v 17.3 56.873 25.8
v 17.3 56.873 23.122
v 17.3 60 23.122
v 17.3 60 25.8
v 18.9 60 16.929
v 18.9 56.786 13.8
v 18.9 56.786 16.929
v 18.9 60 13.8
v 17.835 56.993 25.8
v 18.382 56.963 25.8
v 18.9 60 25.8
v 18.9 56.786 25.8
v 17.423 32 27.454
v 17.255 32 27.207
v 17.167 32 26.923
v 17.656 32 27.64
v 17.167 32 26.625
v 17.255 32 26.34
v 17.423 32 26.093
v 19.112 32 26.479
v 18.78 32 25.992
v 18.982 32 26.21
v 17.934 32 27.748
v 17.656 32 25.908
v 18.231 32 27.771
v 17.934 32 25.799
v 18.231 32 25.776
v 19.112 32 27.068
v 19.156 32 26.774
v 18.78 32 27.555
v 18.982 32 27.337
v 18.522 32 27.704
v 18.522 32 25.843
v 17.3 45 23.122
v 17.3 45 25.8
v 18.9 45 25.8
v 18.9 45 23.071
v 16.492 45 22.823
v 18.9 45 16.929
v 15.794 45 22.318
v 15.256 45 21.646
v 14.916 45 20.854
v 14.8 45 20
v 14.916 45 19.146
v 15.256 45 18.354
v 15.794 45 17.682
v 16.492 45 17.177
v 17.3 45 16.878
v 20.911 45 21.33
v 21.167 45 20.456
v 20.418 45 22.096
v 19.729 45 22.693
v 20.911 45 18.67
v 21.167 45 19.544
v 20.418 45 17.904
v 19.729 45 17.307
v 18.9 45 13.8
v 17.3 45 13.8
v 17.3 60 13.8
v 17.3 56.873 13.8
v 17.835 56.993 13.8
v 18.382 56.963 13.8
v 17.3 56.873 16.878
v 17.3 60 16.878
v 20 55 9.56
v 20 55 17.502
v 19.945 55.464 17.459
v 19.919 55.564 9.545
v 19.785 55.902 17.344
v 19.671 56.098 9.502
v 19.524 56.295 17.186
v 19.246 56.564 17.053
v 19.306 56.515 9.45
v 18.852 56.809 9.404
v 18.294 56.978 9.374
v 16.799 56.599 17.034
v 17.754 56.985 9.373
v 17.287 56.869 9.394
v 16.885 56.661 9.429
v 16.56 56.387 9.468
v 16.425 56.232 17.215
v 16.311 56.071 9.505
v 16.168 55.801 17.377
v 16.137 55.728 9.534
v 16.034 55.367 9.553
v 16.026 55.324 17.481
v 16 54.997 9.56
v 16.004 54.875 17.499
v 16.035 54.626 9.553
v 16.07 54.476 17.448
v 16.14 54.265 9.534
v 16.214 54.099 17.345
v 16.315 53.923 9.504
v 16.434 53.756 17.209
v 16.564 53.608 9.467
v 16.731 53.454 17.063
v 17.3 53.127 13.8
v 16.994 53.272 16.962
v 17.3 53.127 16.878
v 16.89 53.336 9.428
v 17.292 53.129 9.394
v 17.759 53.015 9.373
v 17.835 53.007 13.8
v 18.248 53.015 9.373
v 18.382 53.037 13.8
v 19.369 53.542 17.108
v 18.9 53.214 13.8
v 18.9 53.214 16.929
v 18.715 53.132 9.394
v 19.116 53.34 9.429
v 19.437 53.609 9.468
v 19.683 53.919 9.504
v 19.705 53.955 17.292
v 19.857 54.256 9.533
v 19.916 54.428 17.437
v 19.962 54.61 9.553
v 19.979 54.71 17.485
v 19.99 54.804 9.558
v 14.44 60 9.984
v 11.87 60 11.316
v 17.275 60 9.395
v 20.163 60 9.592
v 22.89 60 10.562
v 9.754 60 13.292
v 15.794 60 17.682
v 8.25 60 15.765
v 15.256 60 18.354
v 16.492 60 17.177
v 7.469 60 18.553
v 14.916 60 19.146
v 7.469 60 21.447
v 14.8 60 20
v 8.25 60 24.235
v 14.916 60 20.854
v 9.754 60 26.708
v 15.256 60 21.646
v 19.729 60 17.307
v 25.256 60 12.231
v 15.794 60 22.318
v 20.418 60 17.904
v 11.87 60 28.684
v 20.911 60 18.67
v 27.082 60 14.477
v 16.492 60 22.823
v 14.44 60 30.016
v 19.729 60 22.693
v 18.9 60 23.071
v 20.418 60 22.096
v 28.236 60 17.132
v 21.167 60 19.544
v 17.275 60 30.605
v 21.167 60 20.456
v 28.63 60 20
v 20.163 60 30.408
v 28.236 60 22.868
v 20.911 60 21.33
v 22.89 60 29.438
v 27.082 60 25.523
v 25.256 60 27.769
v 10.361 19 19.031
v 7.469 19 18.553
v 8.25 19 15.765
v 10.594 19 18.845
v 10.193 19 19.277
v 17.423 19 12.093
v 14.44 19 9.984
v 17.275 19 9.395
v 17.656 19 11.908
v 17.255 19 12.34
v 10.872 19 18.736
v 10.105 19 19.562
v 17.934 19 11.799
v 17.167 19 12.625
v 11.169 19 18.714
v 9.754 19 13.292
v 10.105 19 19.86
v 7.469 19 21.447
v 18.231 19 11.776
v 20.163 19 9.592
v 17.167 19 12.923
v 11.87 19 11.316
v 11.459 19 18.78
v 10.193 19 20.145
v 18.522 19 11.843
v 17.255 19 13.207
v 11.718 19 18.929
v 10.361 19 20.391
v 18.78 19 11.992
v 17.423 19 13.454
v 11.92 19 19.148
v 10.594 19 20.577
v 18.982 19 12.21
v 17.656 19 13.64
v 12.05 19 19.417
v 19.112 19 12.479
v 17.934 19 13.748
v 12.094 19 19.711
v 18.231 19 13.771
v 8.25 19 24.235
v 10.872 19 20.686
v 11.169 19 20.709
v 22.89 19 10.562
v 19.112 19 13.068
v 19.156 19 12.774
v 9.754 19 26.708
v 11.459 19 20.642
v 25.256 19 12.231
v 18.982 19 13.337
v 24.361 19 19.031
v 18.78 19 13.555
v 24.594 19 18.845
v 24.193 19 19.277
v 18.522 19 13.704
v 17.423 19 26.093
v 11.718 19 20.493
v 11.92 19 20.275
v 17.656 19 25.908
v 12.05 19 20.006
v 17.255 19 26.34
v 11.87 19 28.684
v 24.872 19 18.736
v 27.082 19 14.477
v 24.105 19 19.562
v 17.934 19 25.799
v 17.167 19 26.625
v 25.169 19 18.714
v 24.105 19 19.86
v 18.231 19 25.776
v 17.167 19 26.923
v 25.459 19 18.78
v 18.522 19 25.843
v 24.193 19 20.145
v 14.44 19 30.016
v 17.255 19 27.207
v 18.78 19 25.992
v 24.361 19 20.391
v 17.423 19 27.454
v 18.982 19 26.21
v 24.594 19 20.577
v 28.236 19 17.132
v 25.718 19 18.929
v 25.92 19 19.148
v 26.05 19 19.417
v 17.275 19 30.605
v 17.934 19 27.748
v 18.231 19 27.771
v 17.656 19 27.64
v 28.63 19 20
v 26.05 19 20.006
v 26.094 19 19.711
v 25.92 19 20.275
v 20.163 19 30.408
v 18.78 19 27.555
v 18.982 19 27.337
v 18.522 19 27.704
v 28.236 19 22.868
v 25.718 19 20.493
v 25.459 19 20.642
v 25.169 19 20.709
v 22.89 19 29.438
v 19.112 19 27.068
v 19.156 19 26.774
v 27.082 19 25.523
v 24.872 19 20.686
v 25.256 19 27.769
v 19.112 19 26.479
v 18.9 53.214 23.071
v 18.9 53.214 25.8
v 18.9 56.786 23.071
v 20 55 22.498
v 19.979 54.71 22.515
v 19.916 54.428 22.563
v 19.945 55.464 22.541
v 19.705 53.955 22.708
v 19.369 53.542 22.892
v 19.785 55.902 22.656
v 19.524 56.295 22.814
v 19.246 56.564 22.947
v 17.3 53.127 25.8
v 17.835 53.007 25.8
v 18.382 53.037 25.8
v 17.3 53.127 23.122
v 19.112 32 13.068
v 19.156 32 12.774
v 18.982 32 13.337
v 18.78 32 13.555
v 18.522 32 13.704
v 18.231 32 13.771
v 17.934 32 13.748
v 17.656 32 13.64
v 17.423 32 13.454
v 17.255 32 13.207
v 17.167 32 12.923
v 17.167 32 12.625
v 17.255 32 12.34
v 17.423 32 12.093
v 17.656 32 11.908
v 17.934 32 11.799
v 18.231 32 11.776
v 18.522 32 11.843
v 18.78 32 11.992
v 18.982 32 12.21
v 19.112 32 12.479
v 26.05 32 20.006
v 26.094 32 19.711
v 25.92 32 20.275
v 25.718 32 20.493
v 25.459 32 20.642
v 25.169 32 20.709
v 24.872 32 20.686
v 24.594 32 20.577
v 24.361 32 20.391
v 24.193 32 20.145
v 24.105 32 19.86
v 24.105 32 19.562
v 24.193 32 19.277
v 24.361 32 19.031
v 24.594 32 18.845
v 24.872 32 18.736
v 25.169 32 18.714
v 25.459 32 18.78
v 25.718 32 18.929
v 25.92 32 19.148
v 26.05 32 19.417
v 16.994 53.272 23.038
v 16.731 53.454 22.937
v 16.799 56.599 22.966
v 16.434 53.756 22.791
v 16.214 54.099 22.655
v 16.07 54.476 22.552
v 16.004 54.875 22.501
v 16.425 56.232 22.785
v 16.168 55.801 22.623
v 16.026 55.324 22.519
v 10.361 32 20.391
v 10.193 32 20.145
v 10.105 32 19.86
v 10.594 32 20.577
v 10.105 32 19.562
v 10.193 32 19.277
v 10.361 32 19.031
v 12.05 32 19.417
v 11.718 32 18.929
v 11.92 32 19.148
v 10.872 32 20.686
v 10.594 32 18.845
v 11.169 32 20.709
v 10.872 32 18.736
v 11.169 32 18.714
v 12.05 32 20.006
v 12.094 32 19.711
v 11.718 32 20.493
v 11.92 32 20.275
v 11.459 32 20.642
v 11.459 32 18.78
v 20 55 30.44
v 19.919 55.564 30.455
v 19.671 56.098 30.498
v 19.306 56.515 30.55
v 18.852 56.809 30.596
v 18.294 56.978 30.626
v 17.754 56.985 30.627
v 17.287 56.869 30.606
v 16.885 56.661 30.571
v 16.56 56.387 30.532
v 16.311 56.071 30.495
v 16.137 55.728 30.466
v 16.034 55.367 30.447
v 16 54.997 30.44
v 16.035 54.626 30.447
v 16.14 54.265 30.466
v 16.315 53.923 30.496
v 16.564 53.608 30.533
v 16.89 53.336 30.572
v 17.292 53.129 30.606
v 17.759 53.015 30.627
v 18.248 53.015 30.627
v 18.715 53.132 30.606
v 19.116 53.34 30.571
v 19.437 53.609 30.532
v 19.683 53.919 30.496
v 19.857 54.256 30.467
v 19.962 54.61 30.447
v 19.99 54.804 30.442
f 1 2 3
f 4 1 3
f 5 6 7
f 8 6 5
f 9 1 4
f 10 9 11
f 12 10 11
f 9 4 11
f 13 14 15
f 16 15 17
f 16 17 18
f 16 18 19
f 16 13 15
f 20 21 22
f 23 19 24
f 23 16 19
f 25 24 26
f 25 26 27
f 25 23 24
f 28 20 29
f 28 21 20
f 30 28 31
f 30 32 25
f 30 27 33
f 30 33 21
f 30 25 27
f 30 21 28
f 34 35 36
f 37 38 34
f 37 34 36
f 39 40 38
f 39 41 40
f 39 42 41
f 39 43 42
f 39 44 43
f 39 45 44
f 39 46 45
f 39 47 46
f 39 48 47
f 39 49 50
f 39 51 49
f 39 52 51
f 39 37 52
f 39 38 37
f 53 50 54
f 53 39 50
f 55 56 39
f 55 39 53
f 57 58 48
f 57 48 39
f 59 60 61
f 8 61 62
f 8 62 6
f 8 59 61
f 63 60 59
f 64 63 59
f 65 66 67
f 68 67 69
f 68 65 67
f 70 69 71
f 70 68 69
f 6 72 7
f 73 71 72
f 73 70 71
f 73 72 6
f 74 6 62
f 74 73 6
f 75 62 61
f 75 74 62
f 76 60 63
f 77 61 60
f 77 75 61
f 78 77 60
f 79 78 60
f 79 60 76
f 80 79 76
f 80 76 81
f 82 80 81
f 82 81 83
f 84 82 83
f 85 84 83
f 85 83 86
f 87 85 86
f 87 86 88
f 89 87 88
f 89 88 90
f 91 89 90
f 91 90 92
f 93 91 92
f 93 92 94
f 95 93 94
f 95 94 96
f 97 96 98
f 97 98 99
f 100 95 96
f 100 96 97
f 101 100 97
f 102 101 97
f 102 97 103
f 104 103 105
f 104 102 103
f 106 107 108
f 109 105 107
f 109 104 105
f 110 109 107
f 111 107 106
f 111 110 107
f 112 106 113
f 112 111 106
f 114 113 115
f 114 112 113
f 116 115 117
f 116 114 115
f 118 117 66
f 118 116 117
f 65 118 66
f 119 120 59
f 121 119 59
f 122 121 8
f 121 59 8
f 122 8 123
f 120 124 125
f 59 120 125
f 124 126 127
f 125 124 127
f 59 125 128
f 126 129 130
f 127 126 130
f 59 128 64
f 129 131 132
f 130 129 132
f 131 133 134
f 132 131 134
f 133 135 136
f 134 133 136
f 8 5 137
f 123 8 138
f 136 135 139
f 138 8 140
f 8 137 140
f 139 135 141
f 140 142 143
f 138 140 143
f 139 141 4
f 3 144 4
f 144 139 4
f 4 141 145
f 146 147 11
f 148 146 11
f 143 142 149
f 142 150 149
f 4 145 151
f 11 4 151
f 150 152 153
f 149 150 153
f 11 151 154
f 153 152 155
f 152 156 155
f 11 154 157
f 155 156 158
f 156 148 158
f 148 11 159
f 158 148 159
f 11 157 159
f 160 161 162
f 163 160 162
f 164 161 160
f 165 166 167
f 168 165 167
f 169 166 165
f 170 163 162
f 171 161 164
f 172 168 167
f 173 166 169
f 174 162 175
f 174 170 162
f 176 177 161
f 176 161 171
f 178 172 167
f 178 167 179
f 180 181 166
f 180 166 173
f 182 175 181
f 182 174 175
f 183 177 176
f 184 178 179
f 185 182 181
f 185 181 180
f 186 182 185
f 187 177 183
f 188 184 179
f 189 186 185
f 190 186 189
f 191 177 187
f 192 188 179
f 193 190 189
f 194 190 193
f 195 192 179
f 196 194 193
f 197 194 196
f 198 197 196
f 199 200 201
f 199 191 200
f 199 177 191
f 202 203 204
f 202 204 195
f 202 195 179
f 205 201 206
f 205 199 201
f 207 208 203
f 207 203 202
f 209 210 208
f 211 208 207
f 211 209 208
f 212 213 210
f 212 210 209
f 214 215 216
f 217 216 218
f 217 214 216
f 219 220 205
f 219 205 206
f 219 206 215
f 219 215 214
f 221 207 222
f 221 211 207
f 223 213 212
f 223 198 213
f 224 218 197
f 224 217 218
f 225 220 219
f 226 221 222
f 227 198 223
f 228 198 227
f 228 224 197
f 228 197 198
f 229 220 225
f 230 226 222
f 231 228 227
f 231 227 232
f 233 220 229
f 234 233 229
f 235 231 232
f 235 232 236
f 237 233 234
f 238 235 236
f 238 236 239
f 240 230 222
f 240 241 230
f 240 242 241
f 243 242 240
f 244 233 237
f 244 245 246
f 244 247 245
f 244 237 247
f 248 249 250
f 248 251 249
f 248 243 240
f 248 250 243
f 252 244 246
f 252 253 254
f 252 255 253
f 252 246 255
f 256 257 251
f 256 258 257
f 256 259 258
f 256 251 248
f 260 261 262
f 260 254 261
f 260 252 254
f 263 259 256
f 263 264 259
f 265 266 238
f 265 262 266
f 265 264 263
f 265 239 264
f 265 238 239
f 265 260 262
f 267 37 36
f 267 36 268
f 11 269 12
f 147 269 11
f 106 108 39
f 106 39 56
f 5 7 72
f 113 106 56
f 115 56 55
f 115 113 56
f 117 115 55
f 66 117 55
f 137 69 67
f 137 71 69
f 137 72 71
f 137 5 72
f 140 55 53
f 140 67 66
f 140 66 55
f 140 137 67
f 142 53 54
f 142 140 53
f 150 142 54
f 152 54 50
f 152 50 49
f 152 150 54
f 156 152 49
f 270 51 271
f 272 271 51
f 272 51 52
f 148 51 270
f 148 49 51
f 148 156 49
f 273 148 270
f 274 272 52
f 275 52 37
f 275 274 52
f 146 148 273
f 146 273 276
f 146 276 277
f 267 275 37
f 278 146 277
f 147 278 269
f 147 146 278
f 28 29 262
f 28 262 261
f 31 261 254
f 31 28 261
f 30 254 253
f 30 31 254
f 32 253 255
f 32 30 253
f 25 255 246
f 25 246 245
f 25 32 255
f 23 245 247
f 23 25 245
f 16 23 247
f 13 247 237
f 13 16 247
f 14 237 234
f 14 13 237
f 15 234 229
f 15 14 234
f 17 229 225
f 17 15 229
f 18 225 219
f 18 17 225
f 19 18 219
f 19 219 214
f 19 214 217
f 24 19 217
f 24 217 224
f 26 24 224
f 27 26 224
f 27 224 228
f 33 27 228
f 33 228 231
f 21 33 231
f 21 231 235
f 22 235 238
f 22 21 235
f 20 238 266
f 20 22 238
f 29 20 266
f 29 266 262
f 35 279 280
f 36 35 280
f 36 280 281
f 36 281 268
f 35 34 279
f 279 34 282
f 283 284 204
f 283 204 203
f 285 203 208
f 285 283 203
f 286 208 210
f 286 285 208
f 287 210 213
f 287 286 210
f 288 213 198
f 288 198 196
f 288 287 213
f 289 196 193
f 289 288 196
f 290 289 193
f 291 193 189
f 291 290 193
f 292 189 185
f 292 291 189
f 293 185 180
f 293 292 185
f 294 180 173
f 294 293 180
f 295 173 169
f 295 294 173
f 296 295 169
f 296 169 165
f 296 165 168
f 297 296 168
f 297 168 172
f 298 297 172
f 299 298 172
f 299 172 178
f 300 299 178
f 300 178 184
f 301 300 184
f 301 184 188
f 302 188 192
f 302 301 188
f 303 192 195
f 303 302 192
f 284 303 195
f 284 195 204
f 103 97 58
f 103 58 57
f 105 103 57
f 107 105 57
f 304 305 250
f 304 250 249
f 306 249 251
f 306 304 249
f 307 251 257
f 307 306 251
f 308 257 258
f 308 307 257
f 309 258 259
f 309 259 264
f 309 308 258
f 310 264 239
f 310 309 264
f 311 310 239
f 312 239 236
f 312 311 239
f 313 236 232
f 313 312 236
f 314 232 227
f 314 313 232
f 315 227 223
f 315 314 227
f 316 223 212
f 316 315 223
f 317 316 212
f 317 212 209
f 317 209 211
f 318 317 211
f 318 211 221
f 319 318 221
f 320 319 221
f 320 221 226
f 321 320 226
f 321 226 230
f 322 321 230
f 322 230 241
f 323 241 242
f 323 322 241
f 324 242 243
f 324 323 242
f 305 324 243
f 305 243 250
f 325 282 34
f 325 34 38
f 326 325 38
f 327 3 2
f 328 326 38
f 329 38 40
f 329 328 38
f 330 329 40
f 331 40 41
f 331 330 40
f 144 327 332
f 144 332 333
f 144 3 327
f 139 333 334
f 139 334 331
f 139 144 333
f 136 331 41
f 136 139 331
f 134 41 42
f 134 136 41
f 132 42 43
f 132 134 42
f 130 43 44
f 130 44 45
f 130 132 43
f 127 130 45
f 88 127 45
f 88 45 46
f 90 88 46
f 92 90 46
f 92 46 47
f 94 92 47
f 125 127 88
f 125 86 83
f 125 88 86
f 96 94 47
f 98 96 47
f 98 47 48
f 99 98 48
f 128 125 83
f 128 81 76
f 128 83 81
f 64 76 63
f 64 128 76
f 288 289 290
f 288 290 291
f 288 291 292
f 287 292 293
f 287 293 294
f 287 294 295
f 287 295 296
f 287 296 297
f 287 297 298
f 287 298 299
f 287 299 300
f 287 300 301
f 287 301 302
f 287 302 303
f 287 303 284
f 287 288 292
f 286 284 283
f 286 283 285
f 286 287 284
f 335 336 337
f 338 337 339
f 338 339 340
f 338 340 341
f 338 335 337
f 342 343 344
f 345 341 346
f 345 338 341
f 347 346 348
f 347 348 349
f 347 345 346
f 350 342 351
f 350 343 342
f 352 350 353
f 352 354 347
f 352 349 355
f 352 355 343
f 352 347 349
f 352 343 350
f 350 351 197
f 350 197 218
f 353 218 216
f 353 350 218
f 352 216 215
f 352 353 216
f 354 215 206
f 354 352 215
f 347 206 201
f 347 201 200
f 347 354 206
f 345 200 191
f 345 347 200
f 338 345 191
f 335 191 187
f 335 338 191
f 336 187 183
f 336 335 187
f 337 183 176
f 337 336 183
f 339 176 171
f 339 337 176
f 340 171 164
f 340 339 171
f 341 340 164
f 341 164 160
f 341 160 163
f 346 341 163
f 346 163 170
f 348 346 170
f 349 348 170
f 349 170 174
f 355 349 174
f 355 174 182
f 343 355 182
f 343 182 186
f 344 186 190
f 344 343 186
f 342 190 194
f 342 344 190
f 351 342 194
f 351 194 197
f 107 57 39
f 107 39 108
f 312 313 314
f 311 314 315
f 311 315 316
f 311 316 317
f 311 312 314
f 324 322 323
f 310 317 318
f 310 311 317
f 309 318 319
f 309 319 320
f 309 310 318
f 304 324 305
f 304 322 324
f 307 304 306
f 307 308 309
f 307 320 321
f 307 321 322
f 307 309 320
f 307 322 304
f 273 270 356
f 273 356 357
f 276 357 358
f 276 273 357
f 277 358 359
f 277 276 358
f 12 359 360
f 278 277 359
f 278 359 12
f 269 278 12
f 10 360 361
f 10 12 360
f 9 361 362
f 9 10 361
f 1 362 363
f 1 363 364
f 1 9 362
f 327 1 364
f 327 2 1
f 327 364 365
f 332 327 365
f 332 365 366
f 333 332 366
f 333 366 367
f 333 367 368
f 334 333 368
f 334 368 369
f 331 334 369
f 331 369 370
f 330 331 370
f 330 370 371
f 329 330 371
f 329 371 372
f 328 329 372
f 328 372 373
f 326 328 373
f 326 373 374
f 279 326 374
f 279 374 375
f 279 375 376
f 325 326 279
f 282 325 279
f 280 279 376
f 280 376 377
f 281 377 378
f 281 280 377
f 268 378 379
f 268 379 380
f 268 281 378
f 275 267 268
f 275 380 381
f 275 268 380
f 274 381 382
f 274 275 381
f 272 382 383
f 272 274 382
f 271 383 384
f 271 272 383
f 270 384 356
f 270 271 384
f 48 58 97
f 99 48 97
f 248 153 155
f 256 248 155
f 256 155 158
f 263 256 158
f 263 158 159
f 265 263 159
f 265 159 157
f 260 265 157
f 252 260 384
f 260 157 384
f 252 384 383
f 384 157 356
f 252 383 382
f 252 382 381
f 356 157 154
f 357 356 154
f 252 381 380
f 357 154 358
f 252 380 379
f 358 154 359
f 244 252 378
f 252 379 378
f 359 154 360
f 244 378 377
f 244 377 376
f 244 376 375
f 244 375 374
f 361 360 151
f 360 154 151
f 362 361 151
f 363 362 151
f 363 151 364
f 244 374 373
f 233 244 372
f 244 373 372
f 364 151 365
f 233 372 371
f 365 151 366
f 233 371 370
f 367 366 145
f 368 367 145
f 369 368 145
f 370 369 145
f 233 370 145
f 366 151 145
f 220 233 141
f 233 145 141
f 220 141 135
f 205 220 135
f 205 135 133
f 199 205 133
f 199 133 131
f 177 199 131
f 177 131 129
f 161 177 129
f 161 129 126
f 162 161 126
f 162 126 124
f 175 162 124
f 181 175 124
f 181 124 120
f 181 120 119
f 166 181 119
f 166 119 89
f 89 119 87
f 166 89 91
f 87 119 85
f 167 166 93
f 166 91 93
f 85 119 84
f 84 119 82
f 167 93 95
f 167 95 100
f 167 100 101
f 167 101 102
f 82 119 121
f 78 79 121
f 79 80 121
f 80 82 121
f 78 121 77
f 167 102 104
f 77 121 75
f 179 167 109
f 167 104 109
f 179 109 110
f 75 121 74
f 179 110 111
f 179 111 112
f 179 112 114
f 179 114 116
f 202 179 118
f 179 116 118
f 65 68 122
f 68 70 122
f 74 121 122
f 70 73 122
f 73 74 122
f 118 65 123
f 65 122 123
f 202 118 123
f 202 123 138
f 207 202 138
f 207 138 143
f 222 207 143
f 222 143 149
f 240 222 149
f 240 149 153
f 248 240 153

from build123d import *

# Parameters (mm, degrees)
SKETCH_R          = 1
EXTRUDE_DEPTH     = 13
BOX002_W          = 1.6
BOX002_H          = 15
BOX002_DEPTH      = 12
CYLINDER007_R     = 2
CYLINDER007_DEPTH = 22
CYLINDER006_R     = 3.2
CYLINDER006_DEPTH = 15
CYLINDER005_R     = 10.63
CYLINDER005_DEPTH = 41


with BuildPart() as servoholes001:
    # Sketch → Extrude (new body)
    with BuildSketch(Plane.XZ):
        with Locations((11.094024, 19.711318)):
            Circle(SKETCH_R)
        with Locations((25.094024, 19.711318)):
            Circle(SKETCH_R)
        with Locations((18.156256, 26.77355)):
            Circle(SKETCH_R)
        with Locations((18.156256, 12.77355)):
            Circle(SKETCH_R)
    extrude(amount=EXTRUDE_DEPTH)


with BuildPart() as servoholes001_1:
    # Extrude placement: moved
    add(servoholes001.part.moved(Location((0, 32, 0))))


with BuildPart() as slit002:
    # Box002 → Box002 (new body)
    with BuildSketch(Plane(origin=(17.3, 45, 13.8), x_dir=(1, 0, 0), z_dir=(0, 0, 1))):
        with Locations((0.8, 7.5)):
            Rectangle(BOX002_W, BOX002_H)
    extrude(amount=BOX002_DEPTH)


with BuildPart() as bolthole001:
    # Cylinder007 → Cylinder007 (new body)
    with BuildSketch(Plane(origin=(18, 55, 9), x_dir=(1, 0, 0), z_dir=(0, 0, 1))):
        Circle(CYLINDER007_R)
    extrude(amount=CYLINDER007_DEPTH)


with BuildPart() as inner001:
    # Cylinder006 → Cylinder006 (new body)
    with BuildSketch(Plane(origin=(18, 60, 20), x_dir=(1, 0, 0), z_dir=(0, -1, 0))):
        Circle(CYLINDER006_R)
    extrude(amount=CYLINDER006_DEPTH)

    # Fusion003: union slit002, boltHole001
    add(slit002.part)
    add(bolthole001.part)


with BuildPart() as connect001:
    # Cylinder005 → Cylinder005 (new body)
    with BuildSketch(Plane(origin=(18, 60, 20), x_dir=(1, 0, 0), z_dir=(0, -1, 0))):
        Circle(CYLINDER005_R)
    extrude(amount=CYLINDER005_DEPTH)

    # Cut002: cut inner001
    add(inner001.part, mode=Mode.SUBTRACT)

    # Cut003: cut servoHoles001
    add(servoholes001_1.part, mode=Mode.SUBTRACT)


solid = connect001.part
